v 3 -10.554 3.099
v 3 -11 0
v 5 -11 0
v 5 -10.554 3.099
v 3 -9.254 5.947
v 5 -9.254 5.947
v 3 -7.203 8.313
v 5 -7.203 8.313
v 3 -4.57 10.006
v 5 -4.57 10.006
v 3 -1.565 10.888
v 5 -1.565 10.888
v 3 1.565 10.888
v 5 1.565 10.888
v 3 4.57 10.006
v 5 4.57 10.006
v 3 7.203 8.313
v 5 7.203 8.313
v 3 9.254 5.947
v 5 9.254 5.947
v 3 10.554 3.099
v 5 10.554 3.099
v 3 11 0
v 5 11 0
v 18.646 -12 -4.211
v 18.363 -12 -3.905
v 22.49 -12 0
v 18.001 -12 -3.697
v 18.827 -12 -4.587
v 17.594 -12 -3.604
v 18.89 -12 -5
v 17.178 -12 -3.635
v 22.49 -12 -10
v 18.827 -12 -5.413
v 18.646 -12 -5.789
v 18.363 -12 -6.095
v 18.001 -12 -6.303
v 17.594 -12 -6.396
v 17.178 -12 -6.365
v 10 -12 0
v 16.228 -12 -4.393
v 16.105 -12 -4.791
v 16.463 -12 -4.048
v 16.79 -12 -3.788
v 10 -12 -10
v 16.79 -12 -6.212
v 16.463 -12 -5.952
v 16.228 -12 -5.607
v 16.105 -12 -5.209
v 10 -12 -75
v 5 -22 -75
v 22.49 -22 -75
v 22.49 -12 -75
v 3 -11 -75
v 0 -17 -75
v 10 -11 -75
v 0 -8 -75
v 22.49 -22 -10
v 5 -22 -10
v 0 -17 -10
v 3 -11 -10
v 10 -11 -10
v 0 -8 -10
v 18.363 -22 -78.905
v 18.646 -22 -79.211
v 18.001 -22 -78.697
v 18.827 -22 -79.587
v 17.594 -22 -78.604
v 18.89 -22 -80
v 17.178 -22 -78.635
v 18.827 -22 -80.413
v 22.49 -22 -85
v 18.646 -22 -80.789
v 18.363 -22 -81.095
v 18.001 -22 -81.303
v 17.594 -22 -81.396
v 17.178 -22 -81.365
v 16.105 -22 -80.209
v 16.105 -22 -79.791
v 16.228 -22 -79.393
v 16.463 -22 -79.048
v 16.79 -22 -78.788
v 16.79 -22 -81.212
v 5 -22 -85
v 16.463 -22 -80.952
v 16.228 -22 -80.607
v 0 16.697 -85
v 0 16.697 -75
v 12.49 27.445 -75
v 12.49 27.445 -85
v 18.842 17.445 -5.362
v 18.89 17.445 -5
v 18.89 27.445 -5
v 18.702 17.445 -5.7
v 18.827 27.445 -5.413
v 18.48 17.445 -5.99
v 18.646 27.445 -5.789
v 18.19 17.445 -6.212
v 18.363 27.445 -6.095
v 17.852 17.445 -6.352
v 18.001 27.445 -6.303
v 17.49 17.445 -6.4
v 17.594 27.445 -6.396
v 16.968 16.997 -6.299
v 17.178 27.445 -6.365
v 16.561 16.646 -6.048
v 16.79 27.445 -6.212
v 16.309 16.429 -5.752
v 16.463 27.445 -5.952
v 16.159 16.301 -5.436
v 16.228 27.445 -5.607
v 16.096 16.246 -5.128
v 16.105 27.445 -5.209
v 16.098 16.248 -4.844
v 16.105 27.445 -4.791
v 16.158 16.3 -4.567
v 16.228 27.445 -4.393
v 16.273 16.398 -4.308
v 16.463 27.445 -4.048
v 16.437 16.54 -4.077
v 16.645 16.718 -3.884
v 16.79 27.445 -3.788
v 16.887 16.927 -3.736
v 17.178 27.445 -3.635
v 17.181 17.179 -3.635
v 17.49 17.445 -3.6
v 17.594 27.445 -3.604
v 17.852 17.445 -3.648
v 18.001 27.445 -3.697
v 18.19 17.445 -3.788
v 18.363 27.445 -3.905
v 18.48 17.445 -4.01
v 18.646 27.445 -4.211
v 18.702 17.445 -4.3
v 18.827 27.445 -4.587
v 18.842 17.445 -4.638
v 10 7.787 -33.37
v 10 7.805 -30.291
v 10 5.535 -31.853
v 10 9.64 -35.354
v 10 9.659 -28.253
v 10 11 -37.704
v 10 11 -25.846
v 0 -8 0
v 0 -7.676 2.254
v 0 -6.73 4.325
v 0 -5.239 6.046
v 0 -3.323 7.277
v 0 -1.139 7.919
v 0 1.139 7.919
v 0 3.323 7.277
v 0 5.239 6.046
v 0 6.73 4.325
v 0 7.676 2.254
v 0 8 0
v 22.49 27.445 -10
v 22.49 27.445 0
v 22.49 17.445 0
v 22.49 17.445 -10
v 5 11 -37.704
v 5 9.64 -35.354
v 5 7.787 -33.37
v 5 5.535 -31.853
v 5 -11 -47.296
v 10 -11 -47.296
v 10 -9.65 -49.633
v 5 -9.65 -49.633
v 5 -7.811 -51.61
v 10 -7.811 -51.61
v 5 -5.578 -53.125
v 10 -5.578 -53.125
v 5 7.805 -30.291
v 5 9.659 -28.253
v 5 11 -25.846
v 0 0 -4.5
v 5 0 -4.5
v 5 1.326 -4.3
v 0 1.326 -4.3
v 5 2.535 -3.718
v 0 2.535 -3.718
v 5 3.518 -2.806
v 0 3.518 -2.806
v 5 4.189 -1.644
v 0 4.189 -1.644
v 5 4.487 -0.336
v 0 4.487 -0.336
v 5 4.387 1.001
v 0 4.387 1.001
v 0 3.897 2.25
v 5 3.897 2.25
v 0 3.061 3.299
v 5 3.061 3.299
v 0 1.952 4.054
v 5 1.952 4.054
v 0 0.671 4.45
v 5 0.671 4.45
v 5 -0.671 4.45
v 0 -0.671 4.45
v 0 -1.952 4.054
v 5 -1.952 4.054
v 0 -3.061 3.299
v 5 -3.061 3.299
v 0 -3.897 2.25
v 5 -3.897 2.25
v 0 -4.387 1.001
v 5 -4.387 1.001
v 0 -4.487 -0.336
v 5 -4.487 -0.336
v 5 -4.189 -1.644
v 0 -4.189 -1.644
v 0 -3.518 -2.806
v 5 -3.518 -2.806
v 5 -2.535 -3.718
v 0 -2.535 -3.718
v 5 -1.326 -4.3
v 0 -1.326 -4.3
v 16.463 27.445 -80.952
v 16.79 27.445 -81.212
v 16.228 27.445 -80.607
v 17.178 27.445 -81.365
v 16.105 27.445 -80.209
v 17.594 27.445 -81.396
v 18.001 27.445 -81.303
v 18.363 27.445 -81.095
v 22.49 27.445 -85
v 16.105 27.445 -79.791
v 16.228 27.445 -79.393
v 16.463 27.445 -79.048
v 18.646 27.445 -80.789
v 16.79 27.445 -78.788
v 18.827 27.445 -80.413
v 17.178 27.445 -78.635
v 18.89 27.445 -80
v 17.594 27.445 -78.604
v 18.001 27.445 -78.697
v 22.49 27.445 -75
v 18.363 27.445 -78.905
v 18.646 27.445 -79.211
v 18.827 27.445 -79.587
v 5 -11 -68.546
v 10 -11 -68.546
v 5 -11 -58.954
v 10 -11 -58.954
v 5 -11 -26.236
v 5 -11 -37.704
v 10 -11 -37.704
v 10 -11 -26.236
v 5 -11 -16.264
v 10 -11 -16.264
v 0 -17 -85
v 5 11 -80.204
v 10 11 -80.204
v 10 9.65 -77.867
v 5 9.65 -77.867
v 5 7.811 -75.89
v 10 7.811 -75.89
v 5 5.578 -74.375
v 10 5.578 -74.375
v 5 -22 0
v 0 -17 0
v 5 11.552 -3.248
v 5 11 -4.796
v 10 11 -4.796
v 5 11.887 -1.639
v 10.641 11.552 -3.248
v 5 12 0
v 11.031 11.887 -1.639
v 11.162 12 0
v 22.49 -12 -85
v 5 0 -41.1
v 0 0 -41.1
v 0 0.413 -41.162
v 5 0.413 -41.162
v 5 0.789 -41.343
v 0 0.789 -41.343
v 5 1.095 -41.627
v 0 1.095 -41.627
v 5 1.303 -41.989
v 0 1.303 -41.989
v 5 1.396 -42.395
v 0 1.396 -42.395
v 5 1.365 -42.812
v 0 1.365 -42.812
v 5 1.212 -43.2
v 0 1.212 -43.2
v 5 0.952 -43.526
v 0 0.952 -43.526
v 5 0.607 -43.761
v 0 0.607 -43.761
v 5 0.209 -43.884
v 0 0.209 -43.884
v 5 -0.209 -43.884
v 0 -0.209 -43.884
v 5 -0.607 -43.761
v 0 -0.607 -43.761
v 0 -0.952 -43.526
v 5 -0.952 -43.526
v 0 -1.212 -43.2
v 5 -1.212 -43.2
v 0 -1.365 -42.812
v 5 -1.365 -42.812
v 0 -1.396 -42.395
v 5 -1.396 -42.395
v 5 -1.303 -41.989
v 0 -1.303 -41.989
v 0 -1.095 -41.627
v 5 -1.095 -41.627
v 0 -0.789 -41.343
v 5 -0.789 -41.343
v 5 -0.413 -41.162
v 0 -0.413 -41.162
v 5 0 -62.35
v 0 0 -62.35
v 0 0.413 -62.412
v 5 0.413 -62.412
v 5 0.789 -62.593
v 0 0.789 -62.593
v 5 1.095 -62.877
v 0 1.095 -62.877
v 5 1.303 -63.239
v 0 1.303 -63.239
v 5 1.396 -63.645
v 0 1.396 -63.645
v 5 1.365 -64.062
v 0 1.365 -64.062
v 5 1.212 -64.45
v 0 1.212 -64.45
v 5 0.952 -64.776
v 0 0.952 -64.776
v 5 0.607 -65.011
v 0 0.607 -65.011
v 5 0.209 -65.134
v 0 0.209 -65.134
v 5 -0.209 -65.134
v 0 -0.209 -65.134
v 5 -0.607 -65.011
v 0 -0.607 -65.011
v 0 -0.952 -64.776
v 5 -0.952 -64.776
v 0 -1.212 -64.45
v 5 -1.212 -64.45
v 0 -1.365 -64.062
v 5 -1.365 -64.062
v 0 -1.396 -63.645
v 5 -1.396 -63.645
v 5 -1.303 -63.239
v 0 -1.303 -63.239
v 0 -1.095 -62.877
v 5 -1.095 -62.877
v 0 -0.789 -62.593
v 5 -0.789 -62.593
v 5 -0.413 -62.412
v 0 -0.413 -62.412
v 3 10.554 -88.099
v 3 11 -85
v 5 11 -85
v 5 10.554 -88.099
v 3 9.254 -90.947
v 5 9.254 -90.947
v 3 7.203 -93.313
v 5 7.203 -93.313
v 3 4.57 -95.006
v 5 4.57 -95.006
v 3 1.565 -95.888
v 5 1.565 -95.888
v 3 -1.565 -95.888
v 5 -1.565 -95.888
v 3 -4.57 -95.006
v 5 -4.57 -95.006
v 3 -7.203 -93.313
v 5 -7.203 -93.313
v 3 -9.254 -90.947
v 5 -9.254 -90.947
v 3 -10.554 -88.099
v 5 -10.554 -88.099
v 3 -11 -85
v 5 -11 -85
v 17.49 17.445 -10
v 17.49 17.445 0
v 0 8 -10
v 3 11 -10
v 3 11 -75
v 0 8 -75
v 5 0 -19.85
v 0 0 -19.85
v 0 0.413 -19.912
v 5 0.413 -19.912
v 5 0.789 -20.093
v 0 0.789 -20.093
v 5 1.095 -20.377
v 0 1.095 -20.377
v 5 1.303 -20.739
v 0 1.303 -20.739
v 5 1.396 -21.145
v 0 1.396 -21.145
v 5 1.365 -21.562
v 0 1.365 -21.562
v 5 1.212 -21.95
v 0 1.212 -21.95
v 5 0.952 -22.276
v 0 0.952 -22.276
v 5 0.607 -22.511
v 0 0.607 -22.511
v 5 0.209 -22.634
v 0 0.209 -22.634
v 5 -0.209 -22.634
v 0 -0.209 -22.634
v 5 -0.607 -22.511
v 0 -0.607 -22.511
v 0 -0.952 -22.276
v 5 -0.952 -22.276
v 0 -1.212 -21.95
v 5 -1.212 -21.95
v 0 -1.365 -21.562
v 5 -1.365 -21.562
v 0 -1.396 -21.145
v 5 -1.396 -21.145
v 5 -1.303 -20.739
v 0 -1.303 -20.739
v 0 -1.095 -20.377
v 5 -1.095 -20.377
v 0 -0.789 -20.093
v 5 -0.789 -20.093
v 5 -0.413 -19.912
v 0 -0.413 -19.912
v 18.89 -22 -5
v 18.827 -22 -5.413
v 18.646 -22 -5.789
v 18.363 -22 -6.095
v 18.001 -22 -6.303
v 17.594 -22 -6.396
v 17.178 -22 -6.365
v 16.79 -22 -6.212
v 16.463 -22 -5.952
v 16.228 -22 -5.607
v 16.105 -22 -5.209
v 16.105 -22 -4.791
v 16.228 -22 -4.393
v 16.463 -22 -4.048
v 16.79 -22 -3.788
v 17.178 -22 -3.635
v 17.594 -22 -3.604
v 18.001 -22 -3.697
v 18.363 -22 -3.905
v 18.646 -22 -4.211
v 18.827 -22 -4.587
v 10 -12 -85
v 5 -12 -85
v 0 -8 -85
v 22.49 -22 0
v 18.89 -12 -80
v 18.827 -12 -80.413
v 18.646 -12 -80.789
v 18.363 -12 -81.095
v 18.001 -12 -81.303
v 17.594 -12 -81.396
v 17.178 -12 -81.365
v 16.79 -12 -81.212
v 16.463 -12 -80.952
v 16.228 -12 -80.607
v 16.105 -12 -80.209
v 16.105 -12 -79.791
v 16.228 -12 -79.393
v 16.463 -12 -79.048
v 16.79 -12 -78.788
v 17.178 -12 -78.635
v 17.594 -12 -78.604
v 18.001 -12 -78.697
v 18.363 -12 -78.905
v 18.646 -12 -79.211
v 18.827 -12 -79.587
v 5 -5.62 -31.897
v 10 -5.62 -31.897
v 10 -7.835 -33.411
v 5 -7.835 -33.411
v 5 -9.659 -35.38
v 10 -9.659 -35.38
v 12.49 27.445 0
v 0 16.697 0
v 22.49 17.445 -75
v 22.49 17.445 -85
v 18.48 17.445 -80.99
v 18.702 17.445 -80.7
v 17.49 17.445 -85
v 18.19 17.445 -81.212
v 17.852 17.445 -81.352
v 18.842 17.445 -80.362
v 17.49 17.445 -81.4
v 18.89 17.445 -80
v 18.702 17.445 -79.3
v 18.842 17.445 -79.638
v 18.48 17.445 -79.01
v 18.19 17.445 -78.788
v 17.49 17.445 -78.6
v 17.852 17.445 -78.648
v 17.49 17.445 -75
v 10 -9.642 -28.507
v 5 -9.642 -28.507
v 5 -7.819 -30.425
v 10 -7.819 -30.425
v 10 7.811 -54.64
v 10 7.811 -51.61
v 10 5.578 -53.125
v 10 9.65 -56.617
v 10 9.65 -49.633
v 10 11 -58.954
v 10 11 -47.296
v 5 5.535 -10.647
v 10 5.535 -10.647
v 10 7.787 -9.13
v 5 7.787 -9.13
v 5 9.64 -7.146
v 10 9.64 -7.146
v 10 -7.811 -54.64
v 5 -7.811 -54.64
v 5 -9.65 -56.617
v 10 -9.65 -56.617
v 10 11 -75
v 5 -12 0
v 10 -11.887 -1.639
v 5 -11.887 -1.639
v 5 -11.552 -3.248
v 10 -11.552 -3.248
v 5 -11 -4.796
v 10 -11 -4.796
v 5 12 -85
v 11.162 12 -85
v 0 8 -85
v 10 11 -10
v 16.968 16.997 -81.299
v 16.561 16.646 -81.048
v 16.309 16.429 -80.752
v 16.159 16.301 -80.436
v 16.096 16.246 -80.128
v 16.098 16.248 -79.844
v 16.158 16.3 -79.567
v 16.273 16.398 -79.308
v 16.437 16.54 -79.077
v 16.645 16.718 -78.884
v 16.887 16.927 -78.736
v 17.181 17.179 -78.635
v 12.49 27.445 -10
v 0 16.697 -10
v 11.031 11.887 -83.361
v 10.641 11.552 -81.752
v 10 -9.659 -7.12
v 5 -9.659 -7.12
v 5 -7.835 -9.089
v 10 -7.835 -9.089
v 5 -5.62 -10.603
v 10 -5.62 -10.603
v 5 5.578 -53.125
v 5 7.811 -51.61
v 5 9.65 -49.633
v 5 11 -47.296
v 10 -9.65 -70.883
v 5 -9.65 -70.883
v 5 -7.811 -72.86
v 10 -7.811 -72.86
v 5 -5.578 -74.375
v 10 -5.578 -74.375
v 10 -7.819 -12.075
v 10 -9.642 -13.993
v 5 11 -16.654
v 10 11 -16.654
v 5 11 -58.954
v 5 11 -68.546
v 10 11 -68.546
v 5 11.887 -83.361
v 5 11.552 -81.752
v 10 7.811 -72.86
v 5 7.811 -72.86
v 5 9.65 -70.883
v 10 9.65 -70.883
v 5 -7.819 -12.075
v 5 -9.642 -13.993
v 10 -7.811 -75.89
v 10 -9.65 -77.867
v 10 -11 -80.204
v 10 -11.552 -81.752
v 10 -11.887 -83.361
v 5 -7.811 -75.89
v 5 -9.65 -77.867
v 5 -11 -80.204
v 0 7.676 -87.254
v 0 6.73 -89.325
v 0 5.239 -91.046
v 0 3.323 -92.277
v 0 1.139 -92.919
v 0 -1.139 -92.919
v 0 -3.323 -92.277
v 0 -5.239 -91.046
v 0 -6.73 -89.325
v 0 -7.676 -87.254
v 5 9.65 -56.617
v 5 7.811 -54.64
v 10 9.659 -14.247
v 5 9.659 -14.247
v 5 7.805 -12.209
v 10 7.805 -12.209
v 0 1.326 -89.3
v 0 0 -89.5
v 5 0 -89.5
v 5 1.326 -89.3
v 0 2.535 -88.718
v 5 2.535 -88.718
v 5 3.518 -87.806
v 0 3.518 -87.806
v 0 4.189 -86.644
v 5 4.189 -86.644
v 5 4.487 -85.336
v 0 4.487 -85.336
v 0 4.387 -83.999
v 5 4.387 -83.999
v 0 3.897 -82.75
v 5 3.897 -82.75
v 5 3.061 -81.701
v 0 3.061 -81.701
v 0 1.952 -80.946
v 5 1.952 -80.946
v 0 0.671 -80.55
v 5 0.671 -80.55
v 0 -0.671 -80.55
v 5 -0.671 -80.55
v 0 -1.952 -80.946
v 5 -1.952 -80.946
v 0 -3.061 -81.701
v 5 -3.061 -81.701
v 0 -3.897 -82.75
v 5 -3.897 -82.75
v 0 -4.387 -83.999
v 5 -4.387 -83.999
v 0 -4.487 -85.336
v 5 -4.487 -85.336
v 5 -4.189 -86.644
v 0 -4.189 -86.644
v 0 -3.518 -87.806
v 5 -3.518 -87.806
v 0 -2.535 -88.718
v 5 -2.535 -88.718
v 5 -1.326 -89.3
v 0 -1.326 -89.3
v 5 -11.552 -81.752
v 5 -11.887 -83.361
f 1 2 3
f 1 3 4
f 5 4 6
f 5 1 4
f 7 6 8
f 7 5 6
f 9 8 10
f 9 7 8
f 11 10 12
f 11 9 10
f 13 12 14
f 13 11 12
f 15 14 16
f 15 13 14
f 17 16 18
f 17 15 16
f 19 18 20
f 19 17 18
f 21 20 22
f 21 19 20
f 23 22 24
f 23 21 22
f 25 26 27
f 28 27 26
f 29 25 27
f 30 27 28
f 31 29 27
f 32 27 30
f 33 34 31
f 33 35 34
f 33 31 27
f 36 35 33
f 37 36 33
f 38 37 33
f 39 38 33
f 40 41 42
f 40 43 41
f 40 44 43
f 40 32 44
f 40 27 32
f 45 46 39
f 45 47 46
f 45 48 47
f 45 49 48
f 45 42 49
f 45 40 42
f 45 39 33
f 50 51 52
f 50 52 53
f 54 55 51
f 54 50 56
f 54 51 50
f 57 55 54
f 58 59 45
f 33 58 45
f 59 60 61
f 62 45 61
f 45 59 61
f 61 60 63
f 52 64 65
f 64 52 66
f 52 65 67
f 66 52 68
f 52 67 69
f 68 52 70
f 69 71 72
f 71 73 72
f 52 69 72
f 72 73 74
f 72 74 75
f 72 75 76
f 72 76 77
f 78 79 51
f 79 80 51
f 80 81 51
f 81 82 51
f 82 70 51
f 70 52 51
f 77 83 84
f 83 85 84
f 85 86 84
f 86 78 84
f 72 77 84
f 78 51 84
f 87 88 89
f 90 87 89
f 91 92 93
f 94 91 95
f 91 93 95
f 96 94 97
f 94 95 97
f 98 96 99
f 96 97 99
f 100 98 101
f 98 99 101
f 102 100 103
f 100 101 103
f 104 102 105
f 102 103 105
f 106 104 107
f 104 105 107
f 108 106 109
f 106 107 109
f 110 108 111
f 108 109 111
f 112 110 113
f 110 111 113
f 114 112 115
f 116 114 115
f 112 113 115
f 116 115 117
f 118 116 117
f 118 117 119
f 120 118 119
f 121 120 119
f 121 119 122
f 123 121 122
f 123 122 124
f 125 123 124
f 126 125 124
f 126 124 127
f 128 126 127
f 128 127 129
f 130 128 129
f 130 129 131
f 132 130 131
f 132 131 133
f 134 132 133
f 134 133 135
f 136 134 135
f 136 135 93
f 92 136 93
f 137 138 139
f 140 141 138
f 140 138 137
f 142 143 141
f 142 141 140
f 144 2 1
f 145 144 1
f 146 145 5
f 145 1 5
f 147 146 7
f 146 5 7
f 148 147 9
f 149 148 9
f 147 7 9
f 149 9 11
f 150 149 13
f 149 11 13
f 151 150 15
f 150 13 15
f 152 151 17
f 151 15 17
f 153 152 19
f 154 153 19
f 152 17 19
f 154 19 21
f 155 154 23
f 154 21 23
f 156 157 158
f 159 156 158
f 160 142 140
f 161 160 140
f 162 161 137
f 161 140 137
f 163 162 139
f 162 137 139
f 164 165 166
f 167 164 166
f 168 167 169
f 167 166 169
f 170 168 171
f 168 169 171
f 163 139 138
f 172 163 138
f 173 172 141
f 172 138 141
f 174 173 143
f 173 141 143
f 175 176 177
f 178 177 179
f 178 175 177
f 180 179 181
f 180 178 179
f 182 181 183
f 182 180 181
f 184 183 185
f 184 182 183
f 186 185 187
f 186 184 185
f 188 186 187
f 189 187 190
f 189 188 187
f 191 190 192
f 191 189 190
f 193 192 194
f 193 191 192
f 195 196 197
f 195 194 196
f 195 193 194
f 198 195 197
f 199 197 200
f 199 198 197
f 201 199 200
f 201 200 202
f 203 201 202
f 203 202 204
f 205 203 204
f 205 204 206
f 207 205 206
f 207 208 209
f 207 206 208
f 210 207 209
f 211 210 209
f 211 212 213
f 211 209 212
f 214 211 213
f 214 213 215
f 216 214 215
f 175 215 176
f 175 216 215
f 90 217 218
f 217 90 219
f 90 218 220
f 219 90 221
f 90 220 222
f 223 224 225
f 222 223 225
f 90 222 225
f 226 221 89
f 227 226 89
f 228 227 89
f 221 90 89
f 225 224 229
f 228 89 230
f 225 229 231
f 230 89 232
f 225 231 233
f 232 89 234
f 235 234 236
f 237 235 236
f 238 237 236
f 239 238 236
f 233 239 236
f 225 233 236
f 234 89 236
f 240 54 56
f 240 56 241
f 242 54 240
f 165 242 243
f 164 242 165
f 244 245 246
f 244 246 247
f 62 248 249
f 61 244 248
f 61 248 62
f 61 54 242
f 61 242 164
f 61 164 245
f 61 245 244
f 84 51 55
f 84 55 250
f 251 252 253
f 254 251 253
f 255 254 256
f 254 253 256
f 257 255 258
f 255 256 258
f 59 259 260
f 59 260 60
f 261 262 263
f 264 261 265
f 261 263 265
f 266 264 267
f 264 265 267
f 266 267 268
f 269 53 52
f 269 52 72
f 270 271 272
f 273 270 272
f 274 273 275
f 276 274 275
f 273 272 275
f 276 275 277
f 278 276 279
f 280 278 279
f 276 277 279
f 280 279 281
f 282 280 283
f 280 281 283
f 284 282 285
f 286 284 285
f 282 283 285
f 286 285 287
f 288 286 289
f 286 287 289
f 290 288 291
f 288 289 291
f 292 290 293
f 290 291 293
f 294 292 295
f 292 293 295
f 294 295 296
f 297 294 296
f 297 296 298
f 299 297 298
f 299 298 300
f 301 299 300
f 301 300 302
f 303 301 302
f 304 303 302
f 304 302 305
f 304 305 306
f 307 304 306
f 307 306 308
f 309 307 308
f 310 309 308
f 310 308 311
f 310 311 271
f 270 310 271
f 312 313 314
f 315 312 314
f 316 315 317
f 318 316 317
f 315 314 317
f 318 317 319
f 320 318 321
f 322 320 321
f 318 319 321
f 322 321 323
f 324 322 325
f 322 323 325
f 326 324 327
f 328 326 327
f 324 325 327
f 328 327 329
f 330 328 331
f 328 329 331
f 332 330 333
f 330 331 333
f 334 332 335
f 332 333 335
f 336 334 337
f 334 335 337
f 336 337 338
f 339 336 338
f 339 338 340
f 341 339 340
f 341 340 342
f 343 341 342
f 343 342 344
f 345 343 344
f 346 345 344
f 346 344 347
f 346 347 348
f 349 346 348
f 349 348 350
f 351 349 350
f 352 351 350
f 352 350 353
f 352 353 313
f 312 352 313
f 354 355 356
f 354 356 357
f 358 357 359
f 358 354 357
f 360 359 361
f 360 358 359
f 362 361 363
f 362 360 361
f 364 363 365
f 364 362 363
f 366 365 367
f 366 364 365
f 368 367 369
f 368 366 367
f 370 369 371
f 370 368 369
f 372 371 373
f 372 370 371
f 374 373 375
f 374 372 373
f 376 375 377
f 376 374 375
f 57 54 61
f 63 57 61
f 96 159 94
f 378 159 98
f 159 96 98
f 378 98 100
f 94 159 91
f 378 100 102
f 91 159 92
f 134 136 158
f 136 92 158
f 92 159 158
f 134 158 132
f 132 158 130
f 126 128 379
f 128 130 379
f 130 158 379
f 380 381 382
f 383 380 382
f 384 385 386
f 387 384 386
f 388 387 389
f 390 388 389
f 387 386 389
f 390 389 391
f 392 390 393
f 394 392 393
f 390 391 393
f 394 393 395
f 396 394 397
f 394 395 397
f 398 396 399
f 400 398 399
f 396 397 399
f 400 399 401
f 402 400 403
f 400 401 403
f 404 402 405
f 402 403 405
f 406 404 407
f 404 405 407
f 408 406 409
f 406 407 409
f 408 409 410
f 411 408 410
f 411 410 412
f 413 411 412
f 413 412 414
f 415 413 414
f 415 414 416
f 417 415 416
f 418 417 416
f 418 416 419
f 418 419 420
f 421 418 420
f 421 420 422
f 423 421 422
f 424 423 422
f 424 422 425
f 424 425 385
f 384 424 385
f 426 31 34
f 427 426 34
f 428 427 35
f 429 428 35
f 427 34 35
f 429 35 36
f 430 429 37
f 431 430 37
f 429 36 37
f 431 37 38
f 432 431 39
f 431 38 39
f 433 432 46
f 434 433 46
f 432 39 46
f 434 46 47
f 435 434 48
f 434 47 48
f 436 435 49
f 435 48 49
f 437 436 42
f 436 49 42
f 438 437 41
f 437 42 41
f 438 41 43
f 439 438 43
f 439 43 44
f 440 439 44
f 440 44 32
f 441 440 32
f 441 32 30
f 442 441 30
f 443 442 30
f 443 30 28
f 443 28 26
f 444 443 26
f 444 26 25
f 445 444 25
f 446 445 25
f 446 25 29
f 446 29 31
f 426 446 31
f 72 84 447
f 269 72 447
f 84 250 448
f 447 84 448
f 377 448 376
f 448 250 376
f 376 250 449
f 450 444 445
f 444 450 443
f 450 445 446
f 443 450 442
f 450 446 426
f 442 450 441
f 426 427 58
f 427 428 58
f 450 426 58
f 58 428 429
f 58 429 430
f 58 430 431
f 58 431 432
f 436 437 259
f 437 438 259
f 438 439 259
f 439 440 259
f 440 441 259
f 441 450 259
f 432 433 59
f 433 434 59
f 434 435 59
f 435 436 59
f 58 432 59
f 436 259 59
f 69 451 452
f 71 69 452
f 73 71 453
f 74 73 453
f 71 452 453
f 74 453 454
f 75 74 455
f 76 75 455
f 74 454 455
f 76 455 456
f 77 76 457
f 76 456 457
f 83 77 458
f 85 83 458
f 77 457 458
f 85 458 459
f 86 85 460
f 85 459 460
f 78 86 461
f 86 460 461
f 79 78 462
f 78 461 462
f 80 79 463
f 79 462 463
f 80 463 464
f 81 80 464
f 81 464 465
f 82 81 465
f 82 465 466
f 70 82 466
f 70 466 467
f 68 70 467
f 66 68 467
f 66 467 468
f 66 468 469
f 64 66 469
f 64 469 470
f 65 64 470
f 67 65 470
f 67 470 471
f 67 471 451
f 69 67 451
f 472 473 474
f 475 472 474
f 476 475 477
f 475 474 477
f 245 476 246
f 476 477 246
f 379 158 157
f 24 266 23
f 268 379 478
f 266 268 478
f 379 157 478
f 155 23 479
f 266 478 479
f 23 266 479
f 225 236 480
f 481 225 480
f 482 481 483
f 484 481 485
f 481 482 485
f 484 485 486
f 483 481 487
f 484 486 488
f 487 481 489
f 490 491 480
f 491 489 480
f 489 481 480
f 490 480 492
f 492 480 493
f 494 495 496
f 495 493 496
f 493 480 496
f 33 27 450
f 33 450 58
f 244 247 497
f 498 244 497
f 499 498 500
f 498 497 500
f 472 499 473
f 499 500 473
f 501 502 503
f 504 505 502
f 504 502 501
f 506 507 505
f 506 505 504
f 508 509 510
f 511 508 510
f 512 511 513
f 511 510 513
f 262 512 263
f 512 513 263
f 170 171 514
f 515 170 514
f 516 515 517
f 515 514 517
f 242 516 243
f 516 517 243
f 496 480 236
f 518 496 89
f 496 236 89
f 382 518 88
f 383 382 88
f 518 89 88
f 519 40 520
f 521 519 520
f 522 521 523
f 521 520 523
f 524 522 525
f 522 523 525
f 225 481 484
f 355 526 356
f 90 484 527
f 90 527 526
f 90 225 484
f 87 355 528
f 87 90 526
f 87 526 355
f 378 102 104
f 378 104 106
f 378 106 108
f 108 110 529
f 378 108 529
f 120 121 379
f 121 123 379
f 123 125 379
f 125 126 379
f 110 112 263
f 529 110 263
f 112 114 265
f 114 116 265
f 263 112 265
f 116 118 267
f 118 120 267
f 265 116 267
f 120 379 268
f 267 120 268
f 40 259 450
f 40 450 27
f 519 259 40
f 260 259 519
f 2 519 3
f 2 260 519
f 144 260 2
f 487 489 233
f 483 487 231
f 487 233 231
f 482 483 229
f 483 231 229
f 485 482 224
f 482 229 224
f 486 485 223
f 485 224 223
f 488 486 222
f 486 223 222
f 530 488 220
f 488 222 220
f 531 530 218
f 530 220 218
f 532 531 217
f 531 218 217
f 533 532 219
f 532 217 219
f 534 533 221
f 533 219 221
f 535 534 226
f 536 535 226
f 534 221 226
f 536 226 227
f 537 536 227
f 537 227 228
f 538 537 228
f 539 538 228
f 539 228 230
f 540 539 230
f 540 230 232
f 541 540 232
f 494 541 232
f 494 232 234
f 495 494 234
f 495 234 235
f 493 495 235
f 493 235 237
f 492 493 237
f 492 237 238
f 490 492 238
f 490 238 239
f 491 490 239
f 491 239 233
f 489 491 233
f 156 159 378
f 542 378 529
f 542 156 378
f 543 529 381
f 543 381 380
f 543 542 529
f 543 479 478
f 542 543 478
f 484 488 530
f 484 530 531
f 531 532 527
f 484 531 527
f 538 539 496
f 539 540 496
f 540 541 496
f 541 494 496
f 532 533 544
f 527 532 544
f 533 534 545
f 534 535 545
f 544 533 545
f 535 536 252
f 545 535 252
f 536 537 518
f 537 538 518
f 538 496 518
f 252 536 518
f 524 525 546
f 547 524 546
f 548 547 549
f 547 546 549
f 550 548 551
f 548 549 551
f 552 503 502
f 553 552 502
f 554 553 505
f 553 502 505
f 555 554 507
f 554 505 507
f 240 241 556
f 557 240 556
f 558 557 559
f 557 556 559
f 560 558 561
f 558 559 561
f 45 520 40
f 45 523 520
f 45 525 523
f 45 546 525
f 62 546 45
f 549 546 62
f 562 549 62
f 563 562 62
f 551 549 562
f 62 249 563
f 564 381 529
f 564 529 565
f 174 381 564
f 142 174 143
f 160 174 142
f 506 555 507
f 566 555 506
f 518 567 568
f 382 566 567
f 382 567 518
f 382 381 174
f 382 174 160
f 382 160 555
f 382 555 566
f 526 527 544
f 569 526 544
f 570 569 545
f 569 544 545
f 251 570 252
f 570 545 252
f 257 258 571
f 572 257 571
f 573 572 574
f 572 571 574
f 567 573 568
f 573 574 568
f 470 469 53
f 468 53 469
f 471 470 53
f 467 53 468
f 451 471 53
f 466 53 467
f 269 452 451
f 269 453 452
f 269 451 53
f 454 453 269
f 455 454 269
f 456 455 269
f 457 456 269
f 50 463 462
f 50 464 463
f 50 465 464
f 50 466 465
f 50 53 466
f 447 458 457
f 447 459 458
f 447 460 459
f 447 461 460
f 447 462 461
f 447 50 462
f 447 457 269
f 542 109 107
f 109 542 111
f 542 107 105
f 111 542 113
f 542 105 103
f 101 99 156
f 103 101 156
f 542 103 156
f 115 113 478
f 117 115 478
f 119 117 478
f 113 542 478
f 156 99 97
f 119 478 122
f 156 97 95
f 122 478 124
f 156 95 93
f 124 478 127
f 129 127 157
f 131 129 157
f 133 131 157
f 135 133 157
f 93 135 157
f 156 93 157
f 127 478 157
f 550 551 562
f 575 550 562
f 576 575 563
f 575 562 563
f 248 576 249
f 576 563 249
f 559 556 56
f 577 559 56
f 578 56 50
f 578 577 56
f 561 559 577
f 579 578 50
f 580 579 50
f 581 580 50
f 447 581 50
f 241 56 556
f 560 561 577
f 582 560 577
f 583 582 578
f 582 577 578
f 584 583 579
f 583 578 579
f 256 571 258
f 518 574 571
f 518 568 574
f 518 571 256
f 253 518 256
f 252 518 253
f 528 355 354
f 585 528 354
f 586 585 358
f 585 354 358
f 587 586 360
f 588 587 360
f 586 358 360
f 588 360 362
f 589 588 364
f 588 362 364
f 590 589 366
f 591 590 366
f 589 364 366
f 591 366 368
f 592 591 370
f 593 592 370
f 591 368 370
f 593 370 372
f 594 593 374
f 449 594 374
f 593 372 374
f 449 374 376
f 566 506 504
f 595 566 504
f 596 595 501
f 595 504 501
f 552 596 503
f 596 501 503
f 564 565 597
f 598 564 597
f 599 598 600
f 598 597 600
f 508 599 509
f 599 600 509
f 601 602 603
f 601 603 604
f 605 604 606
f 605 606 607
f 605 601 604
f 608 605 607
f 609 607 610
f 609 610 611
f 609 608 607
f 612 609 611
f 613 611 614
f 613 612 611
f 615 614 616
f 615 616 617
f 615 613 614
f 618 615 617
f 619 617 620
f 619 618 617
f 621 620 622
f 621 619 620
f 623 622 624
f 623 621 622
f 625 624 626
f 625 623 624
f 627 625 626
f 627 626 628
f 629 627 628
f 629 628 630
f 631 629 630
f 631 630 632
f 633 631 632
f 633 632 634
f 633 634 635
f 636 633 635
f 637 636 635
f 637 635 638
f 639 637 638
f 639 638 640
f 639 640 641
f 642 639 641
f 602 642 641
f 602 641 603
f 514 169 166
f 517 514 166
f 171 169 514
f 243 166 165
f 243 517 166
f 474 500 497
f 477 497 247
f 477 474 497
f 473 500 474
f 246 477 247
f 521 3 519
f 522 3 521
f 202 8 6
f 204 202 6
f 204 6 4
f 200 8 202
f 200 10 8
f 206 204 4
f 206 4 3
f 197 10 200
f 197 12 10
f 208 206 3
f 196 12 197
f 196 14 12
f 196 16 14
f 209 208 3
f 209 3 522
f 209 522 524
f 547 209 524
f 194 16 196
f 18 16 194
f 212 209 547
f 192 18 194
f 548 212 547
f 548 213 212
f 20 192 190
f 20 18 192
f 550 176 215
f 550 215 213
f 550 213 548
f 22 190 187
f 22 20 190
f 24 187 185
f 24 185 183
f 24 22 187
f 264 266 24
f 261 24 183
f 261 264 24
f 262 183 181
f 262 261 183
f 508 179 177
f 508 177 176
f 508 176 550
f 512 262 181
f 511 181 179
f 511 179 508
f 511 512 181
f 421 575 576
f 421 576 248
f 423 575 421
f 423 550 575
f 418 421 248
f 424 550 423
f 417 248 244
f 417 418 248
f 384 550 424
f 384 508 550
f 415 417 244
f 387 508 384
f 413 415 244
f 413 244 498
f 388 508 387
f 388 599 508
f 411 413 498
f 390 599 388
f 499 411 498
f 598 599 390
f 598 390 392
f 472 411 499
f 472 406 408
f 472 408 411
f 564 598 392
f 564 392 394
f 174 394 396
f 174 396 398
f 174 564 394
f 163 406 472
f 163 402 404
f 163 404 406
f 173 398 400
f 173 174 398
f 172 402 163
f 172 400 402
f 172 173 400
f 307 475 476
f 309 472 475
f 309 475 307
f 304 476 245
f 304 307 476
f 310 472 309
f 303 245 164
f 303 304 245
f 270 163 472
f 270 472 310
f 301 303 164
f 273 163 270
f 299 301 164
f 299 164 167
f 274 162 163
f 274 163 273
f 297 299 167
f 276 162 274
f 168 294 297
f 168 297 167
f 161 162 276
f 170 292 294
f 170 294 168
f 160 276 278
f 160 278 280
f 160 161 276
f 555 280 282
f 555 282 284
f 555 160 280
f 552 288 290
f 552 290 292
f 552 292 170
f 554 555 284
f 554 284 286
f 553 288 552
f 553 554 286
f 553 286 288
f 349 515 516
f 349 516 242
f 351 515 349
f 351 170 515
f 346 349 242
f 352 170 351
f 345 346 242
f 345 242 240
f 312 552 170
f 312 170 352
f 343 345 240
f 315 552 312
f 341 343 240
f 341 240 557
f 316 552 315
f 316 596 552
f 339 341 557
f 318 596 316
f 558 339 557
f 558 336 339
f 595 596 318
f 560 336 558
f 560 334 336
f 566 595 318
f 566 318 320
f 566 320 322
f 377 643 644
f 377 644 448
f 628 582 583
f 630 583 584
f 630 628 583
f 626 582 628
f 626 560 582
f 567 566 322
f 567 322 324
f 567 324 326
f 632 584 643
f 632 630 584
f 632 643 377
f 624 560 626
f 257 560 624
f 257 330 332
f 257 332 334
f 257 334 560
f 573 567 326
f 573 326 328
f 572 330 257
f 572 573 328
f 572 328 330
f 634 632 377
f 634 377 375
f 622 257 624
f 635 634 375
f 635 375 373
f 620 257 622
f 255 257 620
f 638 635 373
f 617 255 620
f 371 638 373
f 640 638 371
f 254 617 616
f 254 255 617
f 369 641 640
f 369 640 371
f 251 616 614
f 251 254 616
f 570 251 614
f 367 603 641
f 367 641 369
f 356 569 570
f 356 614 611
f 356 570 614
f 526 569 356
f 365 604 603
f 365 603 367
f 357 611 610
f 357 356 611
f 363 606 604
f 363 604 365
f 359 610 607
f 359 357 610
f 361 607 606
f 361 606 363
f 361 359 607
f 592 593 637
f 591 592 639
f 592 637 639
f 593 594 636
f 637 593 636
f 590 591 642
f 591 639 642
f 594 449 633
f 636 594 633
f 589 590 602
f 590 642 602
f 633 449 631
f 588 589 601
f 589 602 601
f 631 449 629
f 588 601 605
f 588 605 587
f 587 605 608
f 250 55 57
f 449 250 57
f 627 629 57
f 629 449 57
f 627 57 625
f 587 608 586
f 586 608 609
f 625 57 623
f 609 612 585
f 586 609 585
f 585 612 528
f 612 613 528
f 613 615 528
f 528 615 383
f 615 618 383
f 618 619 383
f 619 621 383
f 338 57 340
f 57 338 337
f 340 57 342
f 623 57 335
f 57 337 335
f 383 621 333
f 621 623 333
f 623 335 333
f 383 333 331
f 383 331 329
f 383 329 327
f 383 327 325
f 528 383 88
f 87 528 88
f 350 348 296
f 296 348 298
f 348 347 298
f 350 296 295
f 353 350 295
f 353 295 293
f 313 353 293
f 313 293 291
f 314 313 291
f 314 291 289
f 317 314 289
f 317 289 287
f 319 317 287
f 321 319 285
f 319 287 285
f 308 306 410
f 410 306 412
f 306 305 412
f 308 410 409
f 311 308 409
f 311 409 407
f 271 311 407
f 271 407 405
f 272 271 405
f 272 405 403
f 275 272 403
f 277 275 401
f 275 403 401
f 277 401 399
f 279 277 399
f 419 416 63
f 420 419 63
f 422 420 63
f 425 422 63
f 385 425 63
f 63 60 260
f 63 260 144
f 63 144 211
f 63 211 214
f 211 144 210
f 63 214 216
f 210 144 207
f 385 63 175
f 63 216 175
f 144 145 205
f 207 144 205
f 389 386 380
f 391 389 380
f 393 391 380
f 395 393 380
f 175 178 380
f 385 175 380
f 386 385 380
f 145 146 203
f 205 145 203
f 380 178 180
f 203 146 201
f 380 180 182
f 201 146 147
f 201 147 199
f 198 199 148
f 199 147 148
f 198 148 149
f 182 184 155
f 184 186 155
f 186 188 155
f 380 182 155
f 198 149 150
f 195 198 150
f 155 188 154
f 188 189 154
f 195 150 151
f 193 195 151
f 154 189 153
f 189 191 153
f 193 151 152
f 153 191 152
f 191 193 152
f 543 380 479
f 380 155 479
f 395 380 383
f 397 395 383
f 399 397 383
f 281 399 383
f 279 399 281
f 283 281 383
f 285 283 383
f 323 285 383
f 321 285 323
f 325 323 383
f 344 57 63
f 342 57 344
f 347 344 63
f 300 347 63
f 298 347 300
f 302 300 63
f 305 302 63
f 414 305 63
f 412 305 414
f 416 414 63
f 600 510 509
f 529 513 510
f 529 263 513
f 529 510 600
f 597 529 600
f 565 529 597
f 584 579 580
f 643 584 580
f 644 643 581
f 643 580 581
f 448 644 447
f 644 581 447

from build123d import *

# Parameters (mm, degrees)
SKETCH1_R                  = 4.5
BOSS_EXTRUDE1_DEPTH        = 10
SKETCH3_R                  = 1.4
CUT_EXTRUDE1_DEPTH         = 11
BOSS_EXTRUDE2_DEPTH        = 10
LPATTERN1_COUNT            = 2
LPATTERN1_PITCH            = 75
SKETCH8_W                  = 10
SKETCH8_H                  = 10
BOSS_EXTRUDE3_DEPTH        = 1
BOSS_EXTRUDE5_START        = -10
SKETCH10_W                 = 10
SKETCH10_H                 = 10
BOSS_EXTRUDE5_DEPTH        = 22.48966
CHAMFER3_SIZE              = 5
LPATTERN3_COUNT            = 2
LPATTERN3_PITCH            = 75
CHAMFER3_OF_LPATTERN3_SIZE = 5
SKETCH6_R                  = 4.5
SKETCH6_R_2                = 1.4
SKETCH6_R_3                = 12
CUT_EXTRUDE3_DEPTH         = 10
CUT_EXTRUDE3_DEPTH_BACK    = 5
SKETCH15_R                 = 1.4
CUT_EXTRUDE4_DEPTH         = 70
CHAMFER4_SIZE              = 3


with BuildPart() as part:
    # Sketch1 → Boss-Extrude1 (new body)
    with BuildSketch(Plane(origin=(0, 0, 0), x_dir=(0, 0, -1), z_dir=(1, 0, 0))):
        with BuildLine():
            Line((0, 11), (85, 11))
            ThreePointArc((85, 11), (96, 0), (85, -11))
            Line((85, -11), (0, -11))
            ThreePointArc((0, -11), (-11, 0), (0, 11))
        make_face()
        Circle(SKETCH1_R, mode=Mode.SUBTRACT)
        with Locations((85, 0)):
            Circle(SKETCH1_R, mode=Mode.SUBTRACT)
    extrude(amount=BOSS_EXTRUDE1_DEPTH)

    # Sketch3 → Cut-Extrude1 (cut, through all)
    with BuildSketch(Plane.ZY):
        with Locations((-42.5, 0)):
            Circle(SKETCH3_R)
        with Locations((-63.75, 0)):
            Circle(SKETCH3_R)
        with Locations((-21.25, 0)):
            Circle(SKETCH3_R)
        with Locations((-148.75, 0)):
            Circle(SKETCH3_R)
        with Locations((-127.5, 0)):
            Circle(SKETCH3_R)
        with Locations((-106.25, 0)):
            Circle(SKETCH3_R)
    extrude(amount=-CUT_EXTRUDE1_DEPTH, mode=Mode.SUBTRACT)

    # Sketch8 → Boss-Extrude3 (add)
    with BuildSketch(Plane(origin=(0, -11, 0), x_dir=(-1, 0, 0), z_dir=(0, -1, 0))):
        with Locations((-5, 5)):
            Rectangle(SKETCH8_W, SKETCH8_H)
    boss_extrude3 = extrude(amount=BOSS_EXTRUDE3_DEPTH)

    # Sketch10 → Boss-Extrude5 (add)
    with BuildSketch(Plane(origin=(10, 0, 0), x_dir=(0, 0, -1), z_dir=(1, 0, 0)).offset(BOSS_EXTRUDE5_START)):
        with Locations((5, -17)):
            Rectangle(SKETCH10_W, SKETCH10_H)
    boss_extrude5 = extrude(amount=BOSS_EXTRUDE5_DEPTH)

    # Chamfer3
    chamfer3_edges = [part.edges().sort_by_distance(p)[0] for p in [
        (0, -22, -5),
    ]]
    chamfer(chamfer3_edges, length=CHAMFER3_SIZE)

    # LPattern3: Boss-Extrude3, Boss-Extrude5 ×2
    with Locations(*[(0, 0, -i * LPATTERN3_PITCH) for i in range(1, LPATTERN3_COUNT)]):
        add(boss_extrude3)
        add(boss_extrude5)

    # Chamfer3 of LPattern3
    chamfer3_of_lpattern3_edges = [part.edges().sort_by_distance(p)[0] for p in [
        (0, -22, -80),
    ]]
    chamfer(chamfer3_of_lpattern3_edges, length=CHAMFER3_OF_LPATTERN3_SIZE)


with BuildPart() as body_2:
    # Sketch7 → Boss-Extrude2 (new body)
    with BuildSketch(Plane.XY):
        Polygon((0, 11), (0, 16.697133846), (12.489660366, 27.445401219), (22.489660366, 27.445401219), (22.489660366, 17.445401219), (17.489660366, 17.445401219), (10, 11), align=None)
    boss_extrude2 = extrude(amount=-BOSS_EXTRUDE2_DEPTH)


with BuildPart() as lpattern1_1:
    # LPattern1: Boss-Extrude2 ×2
    with Locations(*[(0, 0, -i * LPATTERN1_PITCH) for i in range(1, LPATTERN1_COUNT)]):
        add(boss_extrude2)


with BuildPart() as body_2_1:
    add(body_2.part)

    # Combine1: union part, LPattern1_1
    add(part.part)
    add(lpattern1_1.part)

    # Sketch6 → Cut-Extrude3 (cut, two sides)
    with BuildSketch(Plane(origin=(10, 0, 0), x_dir=(0, 0, -1), z_dir=(1, 0, 0))) as cut_extrude3_sk:
        with BuildLine():
            ThreePointArc((10.602696958, -5.619859181), (9.250095943, -0.036989697), (10.647303042, 5.534883732))
            ThreePointArc((10.647303042, 5.534883732), (8.190816519, 8.76986458), (4.795831523, 11))
            Line((4.795831523, 11), (0, 11))
            ThreePointArc((0, 11), (-11, 0), (0, -11))
            Line((0, -11), (4.795831523, -11))
            ThreePointArc((4.795831523, -11), (8.155681986, -8.802548003), (10.602696958, -5.619859181))
        make_face()
        Circle(SKETCH6_R, mode=Mode.SUBTRACT)
        with BuildLine():
            ThreePointArc((10.647303042, 5.534883732), (11.656921474, 2.848891319), (12, 0))
            ThreePointArc((12, 0), (11.645436091, -2.895482387), (10.602696958, -5.619859181))
            ThreePointArc((10.602696958, -5.619859181), (12.983312559, -8.783359135), (16.263795125, -11))
            Line((16.263795125, -11), (26.236204875, -11))
            ThreePointArc((26.236204875, -11), (29.516687441, -8.783359135), (31.897303042, -5.619859181))
            ThreePointArc((31.897303042, -5.619859181), (30.500095943, -0.047985752), (31.852696958, 5.534883732))
            ThreePointArc((31.852696958, 5.534883732), (29.325707811, 8.791000179), (25.846011237, 11))
            Line((25.846011237, 11), (16.653988763, 11))
            ThreePointArc((16.653988763, 11), (13.174292189, 8.791000179), (10.647303042, 5.534883732))
        make_face()
        with Locations((21.25, 0)):
            Circle(SKETCH6_R_2, mode=Mode.SUBTRACT)
        Circle(SKETCH6_R_3)
        with Locations((21.25, -0.084975449)):
            Circle(SKETCH6_R_3)
        with BuildLine():
            ThreePointArc((37.704168477, 11), (34.309183481, 8.76986458), (31.852696958, 5.534883732))
            ThreePointArc((31.852696958, 5.534883732), (32.895436091, 2.810506938), (33.25, -0.084975449))
            ThreePointArc((33.25, -0.084975449), (32.906921474, -2.933866768), (31.897303042, -5.619859181))
            ThreePointArc((31.897303042, -5.619859181), (34.344318014, -8.802548003), (37.704168477, -11))
            Line((37.704168477, -11), (47.295831523, -11))
            ThreePointArc((47.295831523, -11), (50.673198678, -8.786286096), (53.125, -5.577577879))
            ThreePointArc((53.125, -5.577577879), (51.75, 0), (53.125, 5.577577879))
            ThreePointArc((53.125, 5.577577879), (50.673198678, 8.786286096), (47.295831523, 11))
            Line((47.295831523, 11), (37.704168477, 11))
        make_face()
        with Locations((42.5, 0)):
            Circle(SKETCH6_R_2, mode=Mode.SUBTRACT)
        with Locations((42.5, 0)):
            Circle(SKETCH6_R_3)
        with BuildLine():
            ThreePointArc((58.954168477, 11), (55.576801322, 8.786286096), (53.125, 5.577577879))
            ThreePointArc((53.125, 5.577577879), (54.151180198, 2.872281323), (54.5, 0))
            ThreePointArc((54.5, 0), (54.151180198, -2.872281323), (53.125, -5.577577879))
            ThreePointArc((53.125, -5.577577879), (55.576801322, -8.786286096), (58.954168477, -11))
            Line((58.954168477, -11), (68.545831523, -11))
            ThreePointArc((68.545831523, -11), (71.923198678, -8.786286096), (74.375, -5.577577879))
            ThreePointArc((74.375, -5.577577879), (73, 0), (74.375, 5.577577879))
            ThreePointArc((74.375, 5.577577879), (71.923198678, 8.786286096), (68.545831523, 11))
            Line((68.545831523, 11), (58.954168477, 11))
        make_face()
        with Locations((63.75, 0)):
            Circle(SKETCH6_R_2, mode=Mode.SUBTRACT)
        with Locations((63.75, 0)):
            Circle(SKETCH6_R_3)
        with Locations((85, 0)):
            Circle(SKETCH6_R_3)
        with BuildLine():
            ThreePointArc((80.204168477, 11), (76.826801322, 8.786286096), (74.375, 5.577577879))
            ThreePointArc((74.375, 5.577577879), (75.401180198, 2.872281323), (75.75, 0))
            ThreePointArc((75.75, 0), (75.401180198, -2.872281323), (74.375, -5.577577879))
            ThreePointArc((74.375, -5.577577879), (76.826801322, -8.786286096), (80.204168477, -11))
            Line((80.204168477, -11), (85, -11))
            ThreePointArc((85, -11), (96, 0), (85, 11))
            Line((85, 11), (80.204168477, 11))
        make_face()
        with Locations((85, 0)):
            Circle(SKETCH6_R, mode=Mode.SUBTRACT)
        with BuildLine():
            Line((0, 11), (4.795831523, 11))
            ThreePointArc((4.795831523, 11), (-12, 0), (4.795831523, -11))
            Line((4.795831523, -11), (0, -11))
            ThreePointArc((0, -11), (-11, 0), (0, 11))
        make_face()
        with BuildLine():
            ThreePointArc((97, 0), (91.574573055, 10.03867467), (80.204168477, 11))
            Line((80.204168477, 11), (85, 11))
            ThreePointArc((85, 11), (96, 0), (85, -11))
            Line((85, -11), (80.204168477, -11))
            ThreePointArc((80.204168477, -11), (91.574573055, -10.03867467), (97, 0))
        make_face()
    extrude(amount=CUT_EXTRUDE3_DEPTH, mode=Mode.SUBTRACT)
    extrude(cut_extrude3_sk.sketch, amount=-CUT_EXTRUDE3_DEPTH_BACK, mode=Mode.SUBTRACT)

    # Sketch15 → Cut-Extrude4 (cut)
    with BuildSketch(Plane(origin=(0, 27.445401219, 0), x_dir=(1, 0, 0), z_dir=(0, 1, 0))):
        with Locations((17.489660366, 80)):
            Circle(SKETCH15_R)
        with Locations((17.489660366, 5)):
            Circle(SKETCH15_R)
    extrude(amount=-CUT_EXTRUDE4_DEPTH, mode=Mode.SUBTRACT)

    # Chamfer4
    chamfer4_edges = [body_2_1.edges().sort_by_distance(p)[0] for p in [
        (0, -11, -42.5),
        (0, 11, -42.5),
        (0, 0, -96),
        (0, 0, 11),
    ]]
    chamfer(chamfer4_edges, length=CHAMFER4_SIZE)


solid = body_2_1.part
